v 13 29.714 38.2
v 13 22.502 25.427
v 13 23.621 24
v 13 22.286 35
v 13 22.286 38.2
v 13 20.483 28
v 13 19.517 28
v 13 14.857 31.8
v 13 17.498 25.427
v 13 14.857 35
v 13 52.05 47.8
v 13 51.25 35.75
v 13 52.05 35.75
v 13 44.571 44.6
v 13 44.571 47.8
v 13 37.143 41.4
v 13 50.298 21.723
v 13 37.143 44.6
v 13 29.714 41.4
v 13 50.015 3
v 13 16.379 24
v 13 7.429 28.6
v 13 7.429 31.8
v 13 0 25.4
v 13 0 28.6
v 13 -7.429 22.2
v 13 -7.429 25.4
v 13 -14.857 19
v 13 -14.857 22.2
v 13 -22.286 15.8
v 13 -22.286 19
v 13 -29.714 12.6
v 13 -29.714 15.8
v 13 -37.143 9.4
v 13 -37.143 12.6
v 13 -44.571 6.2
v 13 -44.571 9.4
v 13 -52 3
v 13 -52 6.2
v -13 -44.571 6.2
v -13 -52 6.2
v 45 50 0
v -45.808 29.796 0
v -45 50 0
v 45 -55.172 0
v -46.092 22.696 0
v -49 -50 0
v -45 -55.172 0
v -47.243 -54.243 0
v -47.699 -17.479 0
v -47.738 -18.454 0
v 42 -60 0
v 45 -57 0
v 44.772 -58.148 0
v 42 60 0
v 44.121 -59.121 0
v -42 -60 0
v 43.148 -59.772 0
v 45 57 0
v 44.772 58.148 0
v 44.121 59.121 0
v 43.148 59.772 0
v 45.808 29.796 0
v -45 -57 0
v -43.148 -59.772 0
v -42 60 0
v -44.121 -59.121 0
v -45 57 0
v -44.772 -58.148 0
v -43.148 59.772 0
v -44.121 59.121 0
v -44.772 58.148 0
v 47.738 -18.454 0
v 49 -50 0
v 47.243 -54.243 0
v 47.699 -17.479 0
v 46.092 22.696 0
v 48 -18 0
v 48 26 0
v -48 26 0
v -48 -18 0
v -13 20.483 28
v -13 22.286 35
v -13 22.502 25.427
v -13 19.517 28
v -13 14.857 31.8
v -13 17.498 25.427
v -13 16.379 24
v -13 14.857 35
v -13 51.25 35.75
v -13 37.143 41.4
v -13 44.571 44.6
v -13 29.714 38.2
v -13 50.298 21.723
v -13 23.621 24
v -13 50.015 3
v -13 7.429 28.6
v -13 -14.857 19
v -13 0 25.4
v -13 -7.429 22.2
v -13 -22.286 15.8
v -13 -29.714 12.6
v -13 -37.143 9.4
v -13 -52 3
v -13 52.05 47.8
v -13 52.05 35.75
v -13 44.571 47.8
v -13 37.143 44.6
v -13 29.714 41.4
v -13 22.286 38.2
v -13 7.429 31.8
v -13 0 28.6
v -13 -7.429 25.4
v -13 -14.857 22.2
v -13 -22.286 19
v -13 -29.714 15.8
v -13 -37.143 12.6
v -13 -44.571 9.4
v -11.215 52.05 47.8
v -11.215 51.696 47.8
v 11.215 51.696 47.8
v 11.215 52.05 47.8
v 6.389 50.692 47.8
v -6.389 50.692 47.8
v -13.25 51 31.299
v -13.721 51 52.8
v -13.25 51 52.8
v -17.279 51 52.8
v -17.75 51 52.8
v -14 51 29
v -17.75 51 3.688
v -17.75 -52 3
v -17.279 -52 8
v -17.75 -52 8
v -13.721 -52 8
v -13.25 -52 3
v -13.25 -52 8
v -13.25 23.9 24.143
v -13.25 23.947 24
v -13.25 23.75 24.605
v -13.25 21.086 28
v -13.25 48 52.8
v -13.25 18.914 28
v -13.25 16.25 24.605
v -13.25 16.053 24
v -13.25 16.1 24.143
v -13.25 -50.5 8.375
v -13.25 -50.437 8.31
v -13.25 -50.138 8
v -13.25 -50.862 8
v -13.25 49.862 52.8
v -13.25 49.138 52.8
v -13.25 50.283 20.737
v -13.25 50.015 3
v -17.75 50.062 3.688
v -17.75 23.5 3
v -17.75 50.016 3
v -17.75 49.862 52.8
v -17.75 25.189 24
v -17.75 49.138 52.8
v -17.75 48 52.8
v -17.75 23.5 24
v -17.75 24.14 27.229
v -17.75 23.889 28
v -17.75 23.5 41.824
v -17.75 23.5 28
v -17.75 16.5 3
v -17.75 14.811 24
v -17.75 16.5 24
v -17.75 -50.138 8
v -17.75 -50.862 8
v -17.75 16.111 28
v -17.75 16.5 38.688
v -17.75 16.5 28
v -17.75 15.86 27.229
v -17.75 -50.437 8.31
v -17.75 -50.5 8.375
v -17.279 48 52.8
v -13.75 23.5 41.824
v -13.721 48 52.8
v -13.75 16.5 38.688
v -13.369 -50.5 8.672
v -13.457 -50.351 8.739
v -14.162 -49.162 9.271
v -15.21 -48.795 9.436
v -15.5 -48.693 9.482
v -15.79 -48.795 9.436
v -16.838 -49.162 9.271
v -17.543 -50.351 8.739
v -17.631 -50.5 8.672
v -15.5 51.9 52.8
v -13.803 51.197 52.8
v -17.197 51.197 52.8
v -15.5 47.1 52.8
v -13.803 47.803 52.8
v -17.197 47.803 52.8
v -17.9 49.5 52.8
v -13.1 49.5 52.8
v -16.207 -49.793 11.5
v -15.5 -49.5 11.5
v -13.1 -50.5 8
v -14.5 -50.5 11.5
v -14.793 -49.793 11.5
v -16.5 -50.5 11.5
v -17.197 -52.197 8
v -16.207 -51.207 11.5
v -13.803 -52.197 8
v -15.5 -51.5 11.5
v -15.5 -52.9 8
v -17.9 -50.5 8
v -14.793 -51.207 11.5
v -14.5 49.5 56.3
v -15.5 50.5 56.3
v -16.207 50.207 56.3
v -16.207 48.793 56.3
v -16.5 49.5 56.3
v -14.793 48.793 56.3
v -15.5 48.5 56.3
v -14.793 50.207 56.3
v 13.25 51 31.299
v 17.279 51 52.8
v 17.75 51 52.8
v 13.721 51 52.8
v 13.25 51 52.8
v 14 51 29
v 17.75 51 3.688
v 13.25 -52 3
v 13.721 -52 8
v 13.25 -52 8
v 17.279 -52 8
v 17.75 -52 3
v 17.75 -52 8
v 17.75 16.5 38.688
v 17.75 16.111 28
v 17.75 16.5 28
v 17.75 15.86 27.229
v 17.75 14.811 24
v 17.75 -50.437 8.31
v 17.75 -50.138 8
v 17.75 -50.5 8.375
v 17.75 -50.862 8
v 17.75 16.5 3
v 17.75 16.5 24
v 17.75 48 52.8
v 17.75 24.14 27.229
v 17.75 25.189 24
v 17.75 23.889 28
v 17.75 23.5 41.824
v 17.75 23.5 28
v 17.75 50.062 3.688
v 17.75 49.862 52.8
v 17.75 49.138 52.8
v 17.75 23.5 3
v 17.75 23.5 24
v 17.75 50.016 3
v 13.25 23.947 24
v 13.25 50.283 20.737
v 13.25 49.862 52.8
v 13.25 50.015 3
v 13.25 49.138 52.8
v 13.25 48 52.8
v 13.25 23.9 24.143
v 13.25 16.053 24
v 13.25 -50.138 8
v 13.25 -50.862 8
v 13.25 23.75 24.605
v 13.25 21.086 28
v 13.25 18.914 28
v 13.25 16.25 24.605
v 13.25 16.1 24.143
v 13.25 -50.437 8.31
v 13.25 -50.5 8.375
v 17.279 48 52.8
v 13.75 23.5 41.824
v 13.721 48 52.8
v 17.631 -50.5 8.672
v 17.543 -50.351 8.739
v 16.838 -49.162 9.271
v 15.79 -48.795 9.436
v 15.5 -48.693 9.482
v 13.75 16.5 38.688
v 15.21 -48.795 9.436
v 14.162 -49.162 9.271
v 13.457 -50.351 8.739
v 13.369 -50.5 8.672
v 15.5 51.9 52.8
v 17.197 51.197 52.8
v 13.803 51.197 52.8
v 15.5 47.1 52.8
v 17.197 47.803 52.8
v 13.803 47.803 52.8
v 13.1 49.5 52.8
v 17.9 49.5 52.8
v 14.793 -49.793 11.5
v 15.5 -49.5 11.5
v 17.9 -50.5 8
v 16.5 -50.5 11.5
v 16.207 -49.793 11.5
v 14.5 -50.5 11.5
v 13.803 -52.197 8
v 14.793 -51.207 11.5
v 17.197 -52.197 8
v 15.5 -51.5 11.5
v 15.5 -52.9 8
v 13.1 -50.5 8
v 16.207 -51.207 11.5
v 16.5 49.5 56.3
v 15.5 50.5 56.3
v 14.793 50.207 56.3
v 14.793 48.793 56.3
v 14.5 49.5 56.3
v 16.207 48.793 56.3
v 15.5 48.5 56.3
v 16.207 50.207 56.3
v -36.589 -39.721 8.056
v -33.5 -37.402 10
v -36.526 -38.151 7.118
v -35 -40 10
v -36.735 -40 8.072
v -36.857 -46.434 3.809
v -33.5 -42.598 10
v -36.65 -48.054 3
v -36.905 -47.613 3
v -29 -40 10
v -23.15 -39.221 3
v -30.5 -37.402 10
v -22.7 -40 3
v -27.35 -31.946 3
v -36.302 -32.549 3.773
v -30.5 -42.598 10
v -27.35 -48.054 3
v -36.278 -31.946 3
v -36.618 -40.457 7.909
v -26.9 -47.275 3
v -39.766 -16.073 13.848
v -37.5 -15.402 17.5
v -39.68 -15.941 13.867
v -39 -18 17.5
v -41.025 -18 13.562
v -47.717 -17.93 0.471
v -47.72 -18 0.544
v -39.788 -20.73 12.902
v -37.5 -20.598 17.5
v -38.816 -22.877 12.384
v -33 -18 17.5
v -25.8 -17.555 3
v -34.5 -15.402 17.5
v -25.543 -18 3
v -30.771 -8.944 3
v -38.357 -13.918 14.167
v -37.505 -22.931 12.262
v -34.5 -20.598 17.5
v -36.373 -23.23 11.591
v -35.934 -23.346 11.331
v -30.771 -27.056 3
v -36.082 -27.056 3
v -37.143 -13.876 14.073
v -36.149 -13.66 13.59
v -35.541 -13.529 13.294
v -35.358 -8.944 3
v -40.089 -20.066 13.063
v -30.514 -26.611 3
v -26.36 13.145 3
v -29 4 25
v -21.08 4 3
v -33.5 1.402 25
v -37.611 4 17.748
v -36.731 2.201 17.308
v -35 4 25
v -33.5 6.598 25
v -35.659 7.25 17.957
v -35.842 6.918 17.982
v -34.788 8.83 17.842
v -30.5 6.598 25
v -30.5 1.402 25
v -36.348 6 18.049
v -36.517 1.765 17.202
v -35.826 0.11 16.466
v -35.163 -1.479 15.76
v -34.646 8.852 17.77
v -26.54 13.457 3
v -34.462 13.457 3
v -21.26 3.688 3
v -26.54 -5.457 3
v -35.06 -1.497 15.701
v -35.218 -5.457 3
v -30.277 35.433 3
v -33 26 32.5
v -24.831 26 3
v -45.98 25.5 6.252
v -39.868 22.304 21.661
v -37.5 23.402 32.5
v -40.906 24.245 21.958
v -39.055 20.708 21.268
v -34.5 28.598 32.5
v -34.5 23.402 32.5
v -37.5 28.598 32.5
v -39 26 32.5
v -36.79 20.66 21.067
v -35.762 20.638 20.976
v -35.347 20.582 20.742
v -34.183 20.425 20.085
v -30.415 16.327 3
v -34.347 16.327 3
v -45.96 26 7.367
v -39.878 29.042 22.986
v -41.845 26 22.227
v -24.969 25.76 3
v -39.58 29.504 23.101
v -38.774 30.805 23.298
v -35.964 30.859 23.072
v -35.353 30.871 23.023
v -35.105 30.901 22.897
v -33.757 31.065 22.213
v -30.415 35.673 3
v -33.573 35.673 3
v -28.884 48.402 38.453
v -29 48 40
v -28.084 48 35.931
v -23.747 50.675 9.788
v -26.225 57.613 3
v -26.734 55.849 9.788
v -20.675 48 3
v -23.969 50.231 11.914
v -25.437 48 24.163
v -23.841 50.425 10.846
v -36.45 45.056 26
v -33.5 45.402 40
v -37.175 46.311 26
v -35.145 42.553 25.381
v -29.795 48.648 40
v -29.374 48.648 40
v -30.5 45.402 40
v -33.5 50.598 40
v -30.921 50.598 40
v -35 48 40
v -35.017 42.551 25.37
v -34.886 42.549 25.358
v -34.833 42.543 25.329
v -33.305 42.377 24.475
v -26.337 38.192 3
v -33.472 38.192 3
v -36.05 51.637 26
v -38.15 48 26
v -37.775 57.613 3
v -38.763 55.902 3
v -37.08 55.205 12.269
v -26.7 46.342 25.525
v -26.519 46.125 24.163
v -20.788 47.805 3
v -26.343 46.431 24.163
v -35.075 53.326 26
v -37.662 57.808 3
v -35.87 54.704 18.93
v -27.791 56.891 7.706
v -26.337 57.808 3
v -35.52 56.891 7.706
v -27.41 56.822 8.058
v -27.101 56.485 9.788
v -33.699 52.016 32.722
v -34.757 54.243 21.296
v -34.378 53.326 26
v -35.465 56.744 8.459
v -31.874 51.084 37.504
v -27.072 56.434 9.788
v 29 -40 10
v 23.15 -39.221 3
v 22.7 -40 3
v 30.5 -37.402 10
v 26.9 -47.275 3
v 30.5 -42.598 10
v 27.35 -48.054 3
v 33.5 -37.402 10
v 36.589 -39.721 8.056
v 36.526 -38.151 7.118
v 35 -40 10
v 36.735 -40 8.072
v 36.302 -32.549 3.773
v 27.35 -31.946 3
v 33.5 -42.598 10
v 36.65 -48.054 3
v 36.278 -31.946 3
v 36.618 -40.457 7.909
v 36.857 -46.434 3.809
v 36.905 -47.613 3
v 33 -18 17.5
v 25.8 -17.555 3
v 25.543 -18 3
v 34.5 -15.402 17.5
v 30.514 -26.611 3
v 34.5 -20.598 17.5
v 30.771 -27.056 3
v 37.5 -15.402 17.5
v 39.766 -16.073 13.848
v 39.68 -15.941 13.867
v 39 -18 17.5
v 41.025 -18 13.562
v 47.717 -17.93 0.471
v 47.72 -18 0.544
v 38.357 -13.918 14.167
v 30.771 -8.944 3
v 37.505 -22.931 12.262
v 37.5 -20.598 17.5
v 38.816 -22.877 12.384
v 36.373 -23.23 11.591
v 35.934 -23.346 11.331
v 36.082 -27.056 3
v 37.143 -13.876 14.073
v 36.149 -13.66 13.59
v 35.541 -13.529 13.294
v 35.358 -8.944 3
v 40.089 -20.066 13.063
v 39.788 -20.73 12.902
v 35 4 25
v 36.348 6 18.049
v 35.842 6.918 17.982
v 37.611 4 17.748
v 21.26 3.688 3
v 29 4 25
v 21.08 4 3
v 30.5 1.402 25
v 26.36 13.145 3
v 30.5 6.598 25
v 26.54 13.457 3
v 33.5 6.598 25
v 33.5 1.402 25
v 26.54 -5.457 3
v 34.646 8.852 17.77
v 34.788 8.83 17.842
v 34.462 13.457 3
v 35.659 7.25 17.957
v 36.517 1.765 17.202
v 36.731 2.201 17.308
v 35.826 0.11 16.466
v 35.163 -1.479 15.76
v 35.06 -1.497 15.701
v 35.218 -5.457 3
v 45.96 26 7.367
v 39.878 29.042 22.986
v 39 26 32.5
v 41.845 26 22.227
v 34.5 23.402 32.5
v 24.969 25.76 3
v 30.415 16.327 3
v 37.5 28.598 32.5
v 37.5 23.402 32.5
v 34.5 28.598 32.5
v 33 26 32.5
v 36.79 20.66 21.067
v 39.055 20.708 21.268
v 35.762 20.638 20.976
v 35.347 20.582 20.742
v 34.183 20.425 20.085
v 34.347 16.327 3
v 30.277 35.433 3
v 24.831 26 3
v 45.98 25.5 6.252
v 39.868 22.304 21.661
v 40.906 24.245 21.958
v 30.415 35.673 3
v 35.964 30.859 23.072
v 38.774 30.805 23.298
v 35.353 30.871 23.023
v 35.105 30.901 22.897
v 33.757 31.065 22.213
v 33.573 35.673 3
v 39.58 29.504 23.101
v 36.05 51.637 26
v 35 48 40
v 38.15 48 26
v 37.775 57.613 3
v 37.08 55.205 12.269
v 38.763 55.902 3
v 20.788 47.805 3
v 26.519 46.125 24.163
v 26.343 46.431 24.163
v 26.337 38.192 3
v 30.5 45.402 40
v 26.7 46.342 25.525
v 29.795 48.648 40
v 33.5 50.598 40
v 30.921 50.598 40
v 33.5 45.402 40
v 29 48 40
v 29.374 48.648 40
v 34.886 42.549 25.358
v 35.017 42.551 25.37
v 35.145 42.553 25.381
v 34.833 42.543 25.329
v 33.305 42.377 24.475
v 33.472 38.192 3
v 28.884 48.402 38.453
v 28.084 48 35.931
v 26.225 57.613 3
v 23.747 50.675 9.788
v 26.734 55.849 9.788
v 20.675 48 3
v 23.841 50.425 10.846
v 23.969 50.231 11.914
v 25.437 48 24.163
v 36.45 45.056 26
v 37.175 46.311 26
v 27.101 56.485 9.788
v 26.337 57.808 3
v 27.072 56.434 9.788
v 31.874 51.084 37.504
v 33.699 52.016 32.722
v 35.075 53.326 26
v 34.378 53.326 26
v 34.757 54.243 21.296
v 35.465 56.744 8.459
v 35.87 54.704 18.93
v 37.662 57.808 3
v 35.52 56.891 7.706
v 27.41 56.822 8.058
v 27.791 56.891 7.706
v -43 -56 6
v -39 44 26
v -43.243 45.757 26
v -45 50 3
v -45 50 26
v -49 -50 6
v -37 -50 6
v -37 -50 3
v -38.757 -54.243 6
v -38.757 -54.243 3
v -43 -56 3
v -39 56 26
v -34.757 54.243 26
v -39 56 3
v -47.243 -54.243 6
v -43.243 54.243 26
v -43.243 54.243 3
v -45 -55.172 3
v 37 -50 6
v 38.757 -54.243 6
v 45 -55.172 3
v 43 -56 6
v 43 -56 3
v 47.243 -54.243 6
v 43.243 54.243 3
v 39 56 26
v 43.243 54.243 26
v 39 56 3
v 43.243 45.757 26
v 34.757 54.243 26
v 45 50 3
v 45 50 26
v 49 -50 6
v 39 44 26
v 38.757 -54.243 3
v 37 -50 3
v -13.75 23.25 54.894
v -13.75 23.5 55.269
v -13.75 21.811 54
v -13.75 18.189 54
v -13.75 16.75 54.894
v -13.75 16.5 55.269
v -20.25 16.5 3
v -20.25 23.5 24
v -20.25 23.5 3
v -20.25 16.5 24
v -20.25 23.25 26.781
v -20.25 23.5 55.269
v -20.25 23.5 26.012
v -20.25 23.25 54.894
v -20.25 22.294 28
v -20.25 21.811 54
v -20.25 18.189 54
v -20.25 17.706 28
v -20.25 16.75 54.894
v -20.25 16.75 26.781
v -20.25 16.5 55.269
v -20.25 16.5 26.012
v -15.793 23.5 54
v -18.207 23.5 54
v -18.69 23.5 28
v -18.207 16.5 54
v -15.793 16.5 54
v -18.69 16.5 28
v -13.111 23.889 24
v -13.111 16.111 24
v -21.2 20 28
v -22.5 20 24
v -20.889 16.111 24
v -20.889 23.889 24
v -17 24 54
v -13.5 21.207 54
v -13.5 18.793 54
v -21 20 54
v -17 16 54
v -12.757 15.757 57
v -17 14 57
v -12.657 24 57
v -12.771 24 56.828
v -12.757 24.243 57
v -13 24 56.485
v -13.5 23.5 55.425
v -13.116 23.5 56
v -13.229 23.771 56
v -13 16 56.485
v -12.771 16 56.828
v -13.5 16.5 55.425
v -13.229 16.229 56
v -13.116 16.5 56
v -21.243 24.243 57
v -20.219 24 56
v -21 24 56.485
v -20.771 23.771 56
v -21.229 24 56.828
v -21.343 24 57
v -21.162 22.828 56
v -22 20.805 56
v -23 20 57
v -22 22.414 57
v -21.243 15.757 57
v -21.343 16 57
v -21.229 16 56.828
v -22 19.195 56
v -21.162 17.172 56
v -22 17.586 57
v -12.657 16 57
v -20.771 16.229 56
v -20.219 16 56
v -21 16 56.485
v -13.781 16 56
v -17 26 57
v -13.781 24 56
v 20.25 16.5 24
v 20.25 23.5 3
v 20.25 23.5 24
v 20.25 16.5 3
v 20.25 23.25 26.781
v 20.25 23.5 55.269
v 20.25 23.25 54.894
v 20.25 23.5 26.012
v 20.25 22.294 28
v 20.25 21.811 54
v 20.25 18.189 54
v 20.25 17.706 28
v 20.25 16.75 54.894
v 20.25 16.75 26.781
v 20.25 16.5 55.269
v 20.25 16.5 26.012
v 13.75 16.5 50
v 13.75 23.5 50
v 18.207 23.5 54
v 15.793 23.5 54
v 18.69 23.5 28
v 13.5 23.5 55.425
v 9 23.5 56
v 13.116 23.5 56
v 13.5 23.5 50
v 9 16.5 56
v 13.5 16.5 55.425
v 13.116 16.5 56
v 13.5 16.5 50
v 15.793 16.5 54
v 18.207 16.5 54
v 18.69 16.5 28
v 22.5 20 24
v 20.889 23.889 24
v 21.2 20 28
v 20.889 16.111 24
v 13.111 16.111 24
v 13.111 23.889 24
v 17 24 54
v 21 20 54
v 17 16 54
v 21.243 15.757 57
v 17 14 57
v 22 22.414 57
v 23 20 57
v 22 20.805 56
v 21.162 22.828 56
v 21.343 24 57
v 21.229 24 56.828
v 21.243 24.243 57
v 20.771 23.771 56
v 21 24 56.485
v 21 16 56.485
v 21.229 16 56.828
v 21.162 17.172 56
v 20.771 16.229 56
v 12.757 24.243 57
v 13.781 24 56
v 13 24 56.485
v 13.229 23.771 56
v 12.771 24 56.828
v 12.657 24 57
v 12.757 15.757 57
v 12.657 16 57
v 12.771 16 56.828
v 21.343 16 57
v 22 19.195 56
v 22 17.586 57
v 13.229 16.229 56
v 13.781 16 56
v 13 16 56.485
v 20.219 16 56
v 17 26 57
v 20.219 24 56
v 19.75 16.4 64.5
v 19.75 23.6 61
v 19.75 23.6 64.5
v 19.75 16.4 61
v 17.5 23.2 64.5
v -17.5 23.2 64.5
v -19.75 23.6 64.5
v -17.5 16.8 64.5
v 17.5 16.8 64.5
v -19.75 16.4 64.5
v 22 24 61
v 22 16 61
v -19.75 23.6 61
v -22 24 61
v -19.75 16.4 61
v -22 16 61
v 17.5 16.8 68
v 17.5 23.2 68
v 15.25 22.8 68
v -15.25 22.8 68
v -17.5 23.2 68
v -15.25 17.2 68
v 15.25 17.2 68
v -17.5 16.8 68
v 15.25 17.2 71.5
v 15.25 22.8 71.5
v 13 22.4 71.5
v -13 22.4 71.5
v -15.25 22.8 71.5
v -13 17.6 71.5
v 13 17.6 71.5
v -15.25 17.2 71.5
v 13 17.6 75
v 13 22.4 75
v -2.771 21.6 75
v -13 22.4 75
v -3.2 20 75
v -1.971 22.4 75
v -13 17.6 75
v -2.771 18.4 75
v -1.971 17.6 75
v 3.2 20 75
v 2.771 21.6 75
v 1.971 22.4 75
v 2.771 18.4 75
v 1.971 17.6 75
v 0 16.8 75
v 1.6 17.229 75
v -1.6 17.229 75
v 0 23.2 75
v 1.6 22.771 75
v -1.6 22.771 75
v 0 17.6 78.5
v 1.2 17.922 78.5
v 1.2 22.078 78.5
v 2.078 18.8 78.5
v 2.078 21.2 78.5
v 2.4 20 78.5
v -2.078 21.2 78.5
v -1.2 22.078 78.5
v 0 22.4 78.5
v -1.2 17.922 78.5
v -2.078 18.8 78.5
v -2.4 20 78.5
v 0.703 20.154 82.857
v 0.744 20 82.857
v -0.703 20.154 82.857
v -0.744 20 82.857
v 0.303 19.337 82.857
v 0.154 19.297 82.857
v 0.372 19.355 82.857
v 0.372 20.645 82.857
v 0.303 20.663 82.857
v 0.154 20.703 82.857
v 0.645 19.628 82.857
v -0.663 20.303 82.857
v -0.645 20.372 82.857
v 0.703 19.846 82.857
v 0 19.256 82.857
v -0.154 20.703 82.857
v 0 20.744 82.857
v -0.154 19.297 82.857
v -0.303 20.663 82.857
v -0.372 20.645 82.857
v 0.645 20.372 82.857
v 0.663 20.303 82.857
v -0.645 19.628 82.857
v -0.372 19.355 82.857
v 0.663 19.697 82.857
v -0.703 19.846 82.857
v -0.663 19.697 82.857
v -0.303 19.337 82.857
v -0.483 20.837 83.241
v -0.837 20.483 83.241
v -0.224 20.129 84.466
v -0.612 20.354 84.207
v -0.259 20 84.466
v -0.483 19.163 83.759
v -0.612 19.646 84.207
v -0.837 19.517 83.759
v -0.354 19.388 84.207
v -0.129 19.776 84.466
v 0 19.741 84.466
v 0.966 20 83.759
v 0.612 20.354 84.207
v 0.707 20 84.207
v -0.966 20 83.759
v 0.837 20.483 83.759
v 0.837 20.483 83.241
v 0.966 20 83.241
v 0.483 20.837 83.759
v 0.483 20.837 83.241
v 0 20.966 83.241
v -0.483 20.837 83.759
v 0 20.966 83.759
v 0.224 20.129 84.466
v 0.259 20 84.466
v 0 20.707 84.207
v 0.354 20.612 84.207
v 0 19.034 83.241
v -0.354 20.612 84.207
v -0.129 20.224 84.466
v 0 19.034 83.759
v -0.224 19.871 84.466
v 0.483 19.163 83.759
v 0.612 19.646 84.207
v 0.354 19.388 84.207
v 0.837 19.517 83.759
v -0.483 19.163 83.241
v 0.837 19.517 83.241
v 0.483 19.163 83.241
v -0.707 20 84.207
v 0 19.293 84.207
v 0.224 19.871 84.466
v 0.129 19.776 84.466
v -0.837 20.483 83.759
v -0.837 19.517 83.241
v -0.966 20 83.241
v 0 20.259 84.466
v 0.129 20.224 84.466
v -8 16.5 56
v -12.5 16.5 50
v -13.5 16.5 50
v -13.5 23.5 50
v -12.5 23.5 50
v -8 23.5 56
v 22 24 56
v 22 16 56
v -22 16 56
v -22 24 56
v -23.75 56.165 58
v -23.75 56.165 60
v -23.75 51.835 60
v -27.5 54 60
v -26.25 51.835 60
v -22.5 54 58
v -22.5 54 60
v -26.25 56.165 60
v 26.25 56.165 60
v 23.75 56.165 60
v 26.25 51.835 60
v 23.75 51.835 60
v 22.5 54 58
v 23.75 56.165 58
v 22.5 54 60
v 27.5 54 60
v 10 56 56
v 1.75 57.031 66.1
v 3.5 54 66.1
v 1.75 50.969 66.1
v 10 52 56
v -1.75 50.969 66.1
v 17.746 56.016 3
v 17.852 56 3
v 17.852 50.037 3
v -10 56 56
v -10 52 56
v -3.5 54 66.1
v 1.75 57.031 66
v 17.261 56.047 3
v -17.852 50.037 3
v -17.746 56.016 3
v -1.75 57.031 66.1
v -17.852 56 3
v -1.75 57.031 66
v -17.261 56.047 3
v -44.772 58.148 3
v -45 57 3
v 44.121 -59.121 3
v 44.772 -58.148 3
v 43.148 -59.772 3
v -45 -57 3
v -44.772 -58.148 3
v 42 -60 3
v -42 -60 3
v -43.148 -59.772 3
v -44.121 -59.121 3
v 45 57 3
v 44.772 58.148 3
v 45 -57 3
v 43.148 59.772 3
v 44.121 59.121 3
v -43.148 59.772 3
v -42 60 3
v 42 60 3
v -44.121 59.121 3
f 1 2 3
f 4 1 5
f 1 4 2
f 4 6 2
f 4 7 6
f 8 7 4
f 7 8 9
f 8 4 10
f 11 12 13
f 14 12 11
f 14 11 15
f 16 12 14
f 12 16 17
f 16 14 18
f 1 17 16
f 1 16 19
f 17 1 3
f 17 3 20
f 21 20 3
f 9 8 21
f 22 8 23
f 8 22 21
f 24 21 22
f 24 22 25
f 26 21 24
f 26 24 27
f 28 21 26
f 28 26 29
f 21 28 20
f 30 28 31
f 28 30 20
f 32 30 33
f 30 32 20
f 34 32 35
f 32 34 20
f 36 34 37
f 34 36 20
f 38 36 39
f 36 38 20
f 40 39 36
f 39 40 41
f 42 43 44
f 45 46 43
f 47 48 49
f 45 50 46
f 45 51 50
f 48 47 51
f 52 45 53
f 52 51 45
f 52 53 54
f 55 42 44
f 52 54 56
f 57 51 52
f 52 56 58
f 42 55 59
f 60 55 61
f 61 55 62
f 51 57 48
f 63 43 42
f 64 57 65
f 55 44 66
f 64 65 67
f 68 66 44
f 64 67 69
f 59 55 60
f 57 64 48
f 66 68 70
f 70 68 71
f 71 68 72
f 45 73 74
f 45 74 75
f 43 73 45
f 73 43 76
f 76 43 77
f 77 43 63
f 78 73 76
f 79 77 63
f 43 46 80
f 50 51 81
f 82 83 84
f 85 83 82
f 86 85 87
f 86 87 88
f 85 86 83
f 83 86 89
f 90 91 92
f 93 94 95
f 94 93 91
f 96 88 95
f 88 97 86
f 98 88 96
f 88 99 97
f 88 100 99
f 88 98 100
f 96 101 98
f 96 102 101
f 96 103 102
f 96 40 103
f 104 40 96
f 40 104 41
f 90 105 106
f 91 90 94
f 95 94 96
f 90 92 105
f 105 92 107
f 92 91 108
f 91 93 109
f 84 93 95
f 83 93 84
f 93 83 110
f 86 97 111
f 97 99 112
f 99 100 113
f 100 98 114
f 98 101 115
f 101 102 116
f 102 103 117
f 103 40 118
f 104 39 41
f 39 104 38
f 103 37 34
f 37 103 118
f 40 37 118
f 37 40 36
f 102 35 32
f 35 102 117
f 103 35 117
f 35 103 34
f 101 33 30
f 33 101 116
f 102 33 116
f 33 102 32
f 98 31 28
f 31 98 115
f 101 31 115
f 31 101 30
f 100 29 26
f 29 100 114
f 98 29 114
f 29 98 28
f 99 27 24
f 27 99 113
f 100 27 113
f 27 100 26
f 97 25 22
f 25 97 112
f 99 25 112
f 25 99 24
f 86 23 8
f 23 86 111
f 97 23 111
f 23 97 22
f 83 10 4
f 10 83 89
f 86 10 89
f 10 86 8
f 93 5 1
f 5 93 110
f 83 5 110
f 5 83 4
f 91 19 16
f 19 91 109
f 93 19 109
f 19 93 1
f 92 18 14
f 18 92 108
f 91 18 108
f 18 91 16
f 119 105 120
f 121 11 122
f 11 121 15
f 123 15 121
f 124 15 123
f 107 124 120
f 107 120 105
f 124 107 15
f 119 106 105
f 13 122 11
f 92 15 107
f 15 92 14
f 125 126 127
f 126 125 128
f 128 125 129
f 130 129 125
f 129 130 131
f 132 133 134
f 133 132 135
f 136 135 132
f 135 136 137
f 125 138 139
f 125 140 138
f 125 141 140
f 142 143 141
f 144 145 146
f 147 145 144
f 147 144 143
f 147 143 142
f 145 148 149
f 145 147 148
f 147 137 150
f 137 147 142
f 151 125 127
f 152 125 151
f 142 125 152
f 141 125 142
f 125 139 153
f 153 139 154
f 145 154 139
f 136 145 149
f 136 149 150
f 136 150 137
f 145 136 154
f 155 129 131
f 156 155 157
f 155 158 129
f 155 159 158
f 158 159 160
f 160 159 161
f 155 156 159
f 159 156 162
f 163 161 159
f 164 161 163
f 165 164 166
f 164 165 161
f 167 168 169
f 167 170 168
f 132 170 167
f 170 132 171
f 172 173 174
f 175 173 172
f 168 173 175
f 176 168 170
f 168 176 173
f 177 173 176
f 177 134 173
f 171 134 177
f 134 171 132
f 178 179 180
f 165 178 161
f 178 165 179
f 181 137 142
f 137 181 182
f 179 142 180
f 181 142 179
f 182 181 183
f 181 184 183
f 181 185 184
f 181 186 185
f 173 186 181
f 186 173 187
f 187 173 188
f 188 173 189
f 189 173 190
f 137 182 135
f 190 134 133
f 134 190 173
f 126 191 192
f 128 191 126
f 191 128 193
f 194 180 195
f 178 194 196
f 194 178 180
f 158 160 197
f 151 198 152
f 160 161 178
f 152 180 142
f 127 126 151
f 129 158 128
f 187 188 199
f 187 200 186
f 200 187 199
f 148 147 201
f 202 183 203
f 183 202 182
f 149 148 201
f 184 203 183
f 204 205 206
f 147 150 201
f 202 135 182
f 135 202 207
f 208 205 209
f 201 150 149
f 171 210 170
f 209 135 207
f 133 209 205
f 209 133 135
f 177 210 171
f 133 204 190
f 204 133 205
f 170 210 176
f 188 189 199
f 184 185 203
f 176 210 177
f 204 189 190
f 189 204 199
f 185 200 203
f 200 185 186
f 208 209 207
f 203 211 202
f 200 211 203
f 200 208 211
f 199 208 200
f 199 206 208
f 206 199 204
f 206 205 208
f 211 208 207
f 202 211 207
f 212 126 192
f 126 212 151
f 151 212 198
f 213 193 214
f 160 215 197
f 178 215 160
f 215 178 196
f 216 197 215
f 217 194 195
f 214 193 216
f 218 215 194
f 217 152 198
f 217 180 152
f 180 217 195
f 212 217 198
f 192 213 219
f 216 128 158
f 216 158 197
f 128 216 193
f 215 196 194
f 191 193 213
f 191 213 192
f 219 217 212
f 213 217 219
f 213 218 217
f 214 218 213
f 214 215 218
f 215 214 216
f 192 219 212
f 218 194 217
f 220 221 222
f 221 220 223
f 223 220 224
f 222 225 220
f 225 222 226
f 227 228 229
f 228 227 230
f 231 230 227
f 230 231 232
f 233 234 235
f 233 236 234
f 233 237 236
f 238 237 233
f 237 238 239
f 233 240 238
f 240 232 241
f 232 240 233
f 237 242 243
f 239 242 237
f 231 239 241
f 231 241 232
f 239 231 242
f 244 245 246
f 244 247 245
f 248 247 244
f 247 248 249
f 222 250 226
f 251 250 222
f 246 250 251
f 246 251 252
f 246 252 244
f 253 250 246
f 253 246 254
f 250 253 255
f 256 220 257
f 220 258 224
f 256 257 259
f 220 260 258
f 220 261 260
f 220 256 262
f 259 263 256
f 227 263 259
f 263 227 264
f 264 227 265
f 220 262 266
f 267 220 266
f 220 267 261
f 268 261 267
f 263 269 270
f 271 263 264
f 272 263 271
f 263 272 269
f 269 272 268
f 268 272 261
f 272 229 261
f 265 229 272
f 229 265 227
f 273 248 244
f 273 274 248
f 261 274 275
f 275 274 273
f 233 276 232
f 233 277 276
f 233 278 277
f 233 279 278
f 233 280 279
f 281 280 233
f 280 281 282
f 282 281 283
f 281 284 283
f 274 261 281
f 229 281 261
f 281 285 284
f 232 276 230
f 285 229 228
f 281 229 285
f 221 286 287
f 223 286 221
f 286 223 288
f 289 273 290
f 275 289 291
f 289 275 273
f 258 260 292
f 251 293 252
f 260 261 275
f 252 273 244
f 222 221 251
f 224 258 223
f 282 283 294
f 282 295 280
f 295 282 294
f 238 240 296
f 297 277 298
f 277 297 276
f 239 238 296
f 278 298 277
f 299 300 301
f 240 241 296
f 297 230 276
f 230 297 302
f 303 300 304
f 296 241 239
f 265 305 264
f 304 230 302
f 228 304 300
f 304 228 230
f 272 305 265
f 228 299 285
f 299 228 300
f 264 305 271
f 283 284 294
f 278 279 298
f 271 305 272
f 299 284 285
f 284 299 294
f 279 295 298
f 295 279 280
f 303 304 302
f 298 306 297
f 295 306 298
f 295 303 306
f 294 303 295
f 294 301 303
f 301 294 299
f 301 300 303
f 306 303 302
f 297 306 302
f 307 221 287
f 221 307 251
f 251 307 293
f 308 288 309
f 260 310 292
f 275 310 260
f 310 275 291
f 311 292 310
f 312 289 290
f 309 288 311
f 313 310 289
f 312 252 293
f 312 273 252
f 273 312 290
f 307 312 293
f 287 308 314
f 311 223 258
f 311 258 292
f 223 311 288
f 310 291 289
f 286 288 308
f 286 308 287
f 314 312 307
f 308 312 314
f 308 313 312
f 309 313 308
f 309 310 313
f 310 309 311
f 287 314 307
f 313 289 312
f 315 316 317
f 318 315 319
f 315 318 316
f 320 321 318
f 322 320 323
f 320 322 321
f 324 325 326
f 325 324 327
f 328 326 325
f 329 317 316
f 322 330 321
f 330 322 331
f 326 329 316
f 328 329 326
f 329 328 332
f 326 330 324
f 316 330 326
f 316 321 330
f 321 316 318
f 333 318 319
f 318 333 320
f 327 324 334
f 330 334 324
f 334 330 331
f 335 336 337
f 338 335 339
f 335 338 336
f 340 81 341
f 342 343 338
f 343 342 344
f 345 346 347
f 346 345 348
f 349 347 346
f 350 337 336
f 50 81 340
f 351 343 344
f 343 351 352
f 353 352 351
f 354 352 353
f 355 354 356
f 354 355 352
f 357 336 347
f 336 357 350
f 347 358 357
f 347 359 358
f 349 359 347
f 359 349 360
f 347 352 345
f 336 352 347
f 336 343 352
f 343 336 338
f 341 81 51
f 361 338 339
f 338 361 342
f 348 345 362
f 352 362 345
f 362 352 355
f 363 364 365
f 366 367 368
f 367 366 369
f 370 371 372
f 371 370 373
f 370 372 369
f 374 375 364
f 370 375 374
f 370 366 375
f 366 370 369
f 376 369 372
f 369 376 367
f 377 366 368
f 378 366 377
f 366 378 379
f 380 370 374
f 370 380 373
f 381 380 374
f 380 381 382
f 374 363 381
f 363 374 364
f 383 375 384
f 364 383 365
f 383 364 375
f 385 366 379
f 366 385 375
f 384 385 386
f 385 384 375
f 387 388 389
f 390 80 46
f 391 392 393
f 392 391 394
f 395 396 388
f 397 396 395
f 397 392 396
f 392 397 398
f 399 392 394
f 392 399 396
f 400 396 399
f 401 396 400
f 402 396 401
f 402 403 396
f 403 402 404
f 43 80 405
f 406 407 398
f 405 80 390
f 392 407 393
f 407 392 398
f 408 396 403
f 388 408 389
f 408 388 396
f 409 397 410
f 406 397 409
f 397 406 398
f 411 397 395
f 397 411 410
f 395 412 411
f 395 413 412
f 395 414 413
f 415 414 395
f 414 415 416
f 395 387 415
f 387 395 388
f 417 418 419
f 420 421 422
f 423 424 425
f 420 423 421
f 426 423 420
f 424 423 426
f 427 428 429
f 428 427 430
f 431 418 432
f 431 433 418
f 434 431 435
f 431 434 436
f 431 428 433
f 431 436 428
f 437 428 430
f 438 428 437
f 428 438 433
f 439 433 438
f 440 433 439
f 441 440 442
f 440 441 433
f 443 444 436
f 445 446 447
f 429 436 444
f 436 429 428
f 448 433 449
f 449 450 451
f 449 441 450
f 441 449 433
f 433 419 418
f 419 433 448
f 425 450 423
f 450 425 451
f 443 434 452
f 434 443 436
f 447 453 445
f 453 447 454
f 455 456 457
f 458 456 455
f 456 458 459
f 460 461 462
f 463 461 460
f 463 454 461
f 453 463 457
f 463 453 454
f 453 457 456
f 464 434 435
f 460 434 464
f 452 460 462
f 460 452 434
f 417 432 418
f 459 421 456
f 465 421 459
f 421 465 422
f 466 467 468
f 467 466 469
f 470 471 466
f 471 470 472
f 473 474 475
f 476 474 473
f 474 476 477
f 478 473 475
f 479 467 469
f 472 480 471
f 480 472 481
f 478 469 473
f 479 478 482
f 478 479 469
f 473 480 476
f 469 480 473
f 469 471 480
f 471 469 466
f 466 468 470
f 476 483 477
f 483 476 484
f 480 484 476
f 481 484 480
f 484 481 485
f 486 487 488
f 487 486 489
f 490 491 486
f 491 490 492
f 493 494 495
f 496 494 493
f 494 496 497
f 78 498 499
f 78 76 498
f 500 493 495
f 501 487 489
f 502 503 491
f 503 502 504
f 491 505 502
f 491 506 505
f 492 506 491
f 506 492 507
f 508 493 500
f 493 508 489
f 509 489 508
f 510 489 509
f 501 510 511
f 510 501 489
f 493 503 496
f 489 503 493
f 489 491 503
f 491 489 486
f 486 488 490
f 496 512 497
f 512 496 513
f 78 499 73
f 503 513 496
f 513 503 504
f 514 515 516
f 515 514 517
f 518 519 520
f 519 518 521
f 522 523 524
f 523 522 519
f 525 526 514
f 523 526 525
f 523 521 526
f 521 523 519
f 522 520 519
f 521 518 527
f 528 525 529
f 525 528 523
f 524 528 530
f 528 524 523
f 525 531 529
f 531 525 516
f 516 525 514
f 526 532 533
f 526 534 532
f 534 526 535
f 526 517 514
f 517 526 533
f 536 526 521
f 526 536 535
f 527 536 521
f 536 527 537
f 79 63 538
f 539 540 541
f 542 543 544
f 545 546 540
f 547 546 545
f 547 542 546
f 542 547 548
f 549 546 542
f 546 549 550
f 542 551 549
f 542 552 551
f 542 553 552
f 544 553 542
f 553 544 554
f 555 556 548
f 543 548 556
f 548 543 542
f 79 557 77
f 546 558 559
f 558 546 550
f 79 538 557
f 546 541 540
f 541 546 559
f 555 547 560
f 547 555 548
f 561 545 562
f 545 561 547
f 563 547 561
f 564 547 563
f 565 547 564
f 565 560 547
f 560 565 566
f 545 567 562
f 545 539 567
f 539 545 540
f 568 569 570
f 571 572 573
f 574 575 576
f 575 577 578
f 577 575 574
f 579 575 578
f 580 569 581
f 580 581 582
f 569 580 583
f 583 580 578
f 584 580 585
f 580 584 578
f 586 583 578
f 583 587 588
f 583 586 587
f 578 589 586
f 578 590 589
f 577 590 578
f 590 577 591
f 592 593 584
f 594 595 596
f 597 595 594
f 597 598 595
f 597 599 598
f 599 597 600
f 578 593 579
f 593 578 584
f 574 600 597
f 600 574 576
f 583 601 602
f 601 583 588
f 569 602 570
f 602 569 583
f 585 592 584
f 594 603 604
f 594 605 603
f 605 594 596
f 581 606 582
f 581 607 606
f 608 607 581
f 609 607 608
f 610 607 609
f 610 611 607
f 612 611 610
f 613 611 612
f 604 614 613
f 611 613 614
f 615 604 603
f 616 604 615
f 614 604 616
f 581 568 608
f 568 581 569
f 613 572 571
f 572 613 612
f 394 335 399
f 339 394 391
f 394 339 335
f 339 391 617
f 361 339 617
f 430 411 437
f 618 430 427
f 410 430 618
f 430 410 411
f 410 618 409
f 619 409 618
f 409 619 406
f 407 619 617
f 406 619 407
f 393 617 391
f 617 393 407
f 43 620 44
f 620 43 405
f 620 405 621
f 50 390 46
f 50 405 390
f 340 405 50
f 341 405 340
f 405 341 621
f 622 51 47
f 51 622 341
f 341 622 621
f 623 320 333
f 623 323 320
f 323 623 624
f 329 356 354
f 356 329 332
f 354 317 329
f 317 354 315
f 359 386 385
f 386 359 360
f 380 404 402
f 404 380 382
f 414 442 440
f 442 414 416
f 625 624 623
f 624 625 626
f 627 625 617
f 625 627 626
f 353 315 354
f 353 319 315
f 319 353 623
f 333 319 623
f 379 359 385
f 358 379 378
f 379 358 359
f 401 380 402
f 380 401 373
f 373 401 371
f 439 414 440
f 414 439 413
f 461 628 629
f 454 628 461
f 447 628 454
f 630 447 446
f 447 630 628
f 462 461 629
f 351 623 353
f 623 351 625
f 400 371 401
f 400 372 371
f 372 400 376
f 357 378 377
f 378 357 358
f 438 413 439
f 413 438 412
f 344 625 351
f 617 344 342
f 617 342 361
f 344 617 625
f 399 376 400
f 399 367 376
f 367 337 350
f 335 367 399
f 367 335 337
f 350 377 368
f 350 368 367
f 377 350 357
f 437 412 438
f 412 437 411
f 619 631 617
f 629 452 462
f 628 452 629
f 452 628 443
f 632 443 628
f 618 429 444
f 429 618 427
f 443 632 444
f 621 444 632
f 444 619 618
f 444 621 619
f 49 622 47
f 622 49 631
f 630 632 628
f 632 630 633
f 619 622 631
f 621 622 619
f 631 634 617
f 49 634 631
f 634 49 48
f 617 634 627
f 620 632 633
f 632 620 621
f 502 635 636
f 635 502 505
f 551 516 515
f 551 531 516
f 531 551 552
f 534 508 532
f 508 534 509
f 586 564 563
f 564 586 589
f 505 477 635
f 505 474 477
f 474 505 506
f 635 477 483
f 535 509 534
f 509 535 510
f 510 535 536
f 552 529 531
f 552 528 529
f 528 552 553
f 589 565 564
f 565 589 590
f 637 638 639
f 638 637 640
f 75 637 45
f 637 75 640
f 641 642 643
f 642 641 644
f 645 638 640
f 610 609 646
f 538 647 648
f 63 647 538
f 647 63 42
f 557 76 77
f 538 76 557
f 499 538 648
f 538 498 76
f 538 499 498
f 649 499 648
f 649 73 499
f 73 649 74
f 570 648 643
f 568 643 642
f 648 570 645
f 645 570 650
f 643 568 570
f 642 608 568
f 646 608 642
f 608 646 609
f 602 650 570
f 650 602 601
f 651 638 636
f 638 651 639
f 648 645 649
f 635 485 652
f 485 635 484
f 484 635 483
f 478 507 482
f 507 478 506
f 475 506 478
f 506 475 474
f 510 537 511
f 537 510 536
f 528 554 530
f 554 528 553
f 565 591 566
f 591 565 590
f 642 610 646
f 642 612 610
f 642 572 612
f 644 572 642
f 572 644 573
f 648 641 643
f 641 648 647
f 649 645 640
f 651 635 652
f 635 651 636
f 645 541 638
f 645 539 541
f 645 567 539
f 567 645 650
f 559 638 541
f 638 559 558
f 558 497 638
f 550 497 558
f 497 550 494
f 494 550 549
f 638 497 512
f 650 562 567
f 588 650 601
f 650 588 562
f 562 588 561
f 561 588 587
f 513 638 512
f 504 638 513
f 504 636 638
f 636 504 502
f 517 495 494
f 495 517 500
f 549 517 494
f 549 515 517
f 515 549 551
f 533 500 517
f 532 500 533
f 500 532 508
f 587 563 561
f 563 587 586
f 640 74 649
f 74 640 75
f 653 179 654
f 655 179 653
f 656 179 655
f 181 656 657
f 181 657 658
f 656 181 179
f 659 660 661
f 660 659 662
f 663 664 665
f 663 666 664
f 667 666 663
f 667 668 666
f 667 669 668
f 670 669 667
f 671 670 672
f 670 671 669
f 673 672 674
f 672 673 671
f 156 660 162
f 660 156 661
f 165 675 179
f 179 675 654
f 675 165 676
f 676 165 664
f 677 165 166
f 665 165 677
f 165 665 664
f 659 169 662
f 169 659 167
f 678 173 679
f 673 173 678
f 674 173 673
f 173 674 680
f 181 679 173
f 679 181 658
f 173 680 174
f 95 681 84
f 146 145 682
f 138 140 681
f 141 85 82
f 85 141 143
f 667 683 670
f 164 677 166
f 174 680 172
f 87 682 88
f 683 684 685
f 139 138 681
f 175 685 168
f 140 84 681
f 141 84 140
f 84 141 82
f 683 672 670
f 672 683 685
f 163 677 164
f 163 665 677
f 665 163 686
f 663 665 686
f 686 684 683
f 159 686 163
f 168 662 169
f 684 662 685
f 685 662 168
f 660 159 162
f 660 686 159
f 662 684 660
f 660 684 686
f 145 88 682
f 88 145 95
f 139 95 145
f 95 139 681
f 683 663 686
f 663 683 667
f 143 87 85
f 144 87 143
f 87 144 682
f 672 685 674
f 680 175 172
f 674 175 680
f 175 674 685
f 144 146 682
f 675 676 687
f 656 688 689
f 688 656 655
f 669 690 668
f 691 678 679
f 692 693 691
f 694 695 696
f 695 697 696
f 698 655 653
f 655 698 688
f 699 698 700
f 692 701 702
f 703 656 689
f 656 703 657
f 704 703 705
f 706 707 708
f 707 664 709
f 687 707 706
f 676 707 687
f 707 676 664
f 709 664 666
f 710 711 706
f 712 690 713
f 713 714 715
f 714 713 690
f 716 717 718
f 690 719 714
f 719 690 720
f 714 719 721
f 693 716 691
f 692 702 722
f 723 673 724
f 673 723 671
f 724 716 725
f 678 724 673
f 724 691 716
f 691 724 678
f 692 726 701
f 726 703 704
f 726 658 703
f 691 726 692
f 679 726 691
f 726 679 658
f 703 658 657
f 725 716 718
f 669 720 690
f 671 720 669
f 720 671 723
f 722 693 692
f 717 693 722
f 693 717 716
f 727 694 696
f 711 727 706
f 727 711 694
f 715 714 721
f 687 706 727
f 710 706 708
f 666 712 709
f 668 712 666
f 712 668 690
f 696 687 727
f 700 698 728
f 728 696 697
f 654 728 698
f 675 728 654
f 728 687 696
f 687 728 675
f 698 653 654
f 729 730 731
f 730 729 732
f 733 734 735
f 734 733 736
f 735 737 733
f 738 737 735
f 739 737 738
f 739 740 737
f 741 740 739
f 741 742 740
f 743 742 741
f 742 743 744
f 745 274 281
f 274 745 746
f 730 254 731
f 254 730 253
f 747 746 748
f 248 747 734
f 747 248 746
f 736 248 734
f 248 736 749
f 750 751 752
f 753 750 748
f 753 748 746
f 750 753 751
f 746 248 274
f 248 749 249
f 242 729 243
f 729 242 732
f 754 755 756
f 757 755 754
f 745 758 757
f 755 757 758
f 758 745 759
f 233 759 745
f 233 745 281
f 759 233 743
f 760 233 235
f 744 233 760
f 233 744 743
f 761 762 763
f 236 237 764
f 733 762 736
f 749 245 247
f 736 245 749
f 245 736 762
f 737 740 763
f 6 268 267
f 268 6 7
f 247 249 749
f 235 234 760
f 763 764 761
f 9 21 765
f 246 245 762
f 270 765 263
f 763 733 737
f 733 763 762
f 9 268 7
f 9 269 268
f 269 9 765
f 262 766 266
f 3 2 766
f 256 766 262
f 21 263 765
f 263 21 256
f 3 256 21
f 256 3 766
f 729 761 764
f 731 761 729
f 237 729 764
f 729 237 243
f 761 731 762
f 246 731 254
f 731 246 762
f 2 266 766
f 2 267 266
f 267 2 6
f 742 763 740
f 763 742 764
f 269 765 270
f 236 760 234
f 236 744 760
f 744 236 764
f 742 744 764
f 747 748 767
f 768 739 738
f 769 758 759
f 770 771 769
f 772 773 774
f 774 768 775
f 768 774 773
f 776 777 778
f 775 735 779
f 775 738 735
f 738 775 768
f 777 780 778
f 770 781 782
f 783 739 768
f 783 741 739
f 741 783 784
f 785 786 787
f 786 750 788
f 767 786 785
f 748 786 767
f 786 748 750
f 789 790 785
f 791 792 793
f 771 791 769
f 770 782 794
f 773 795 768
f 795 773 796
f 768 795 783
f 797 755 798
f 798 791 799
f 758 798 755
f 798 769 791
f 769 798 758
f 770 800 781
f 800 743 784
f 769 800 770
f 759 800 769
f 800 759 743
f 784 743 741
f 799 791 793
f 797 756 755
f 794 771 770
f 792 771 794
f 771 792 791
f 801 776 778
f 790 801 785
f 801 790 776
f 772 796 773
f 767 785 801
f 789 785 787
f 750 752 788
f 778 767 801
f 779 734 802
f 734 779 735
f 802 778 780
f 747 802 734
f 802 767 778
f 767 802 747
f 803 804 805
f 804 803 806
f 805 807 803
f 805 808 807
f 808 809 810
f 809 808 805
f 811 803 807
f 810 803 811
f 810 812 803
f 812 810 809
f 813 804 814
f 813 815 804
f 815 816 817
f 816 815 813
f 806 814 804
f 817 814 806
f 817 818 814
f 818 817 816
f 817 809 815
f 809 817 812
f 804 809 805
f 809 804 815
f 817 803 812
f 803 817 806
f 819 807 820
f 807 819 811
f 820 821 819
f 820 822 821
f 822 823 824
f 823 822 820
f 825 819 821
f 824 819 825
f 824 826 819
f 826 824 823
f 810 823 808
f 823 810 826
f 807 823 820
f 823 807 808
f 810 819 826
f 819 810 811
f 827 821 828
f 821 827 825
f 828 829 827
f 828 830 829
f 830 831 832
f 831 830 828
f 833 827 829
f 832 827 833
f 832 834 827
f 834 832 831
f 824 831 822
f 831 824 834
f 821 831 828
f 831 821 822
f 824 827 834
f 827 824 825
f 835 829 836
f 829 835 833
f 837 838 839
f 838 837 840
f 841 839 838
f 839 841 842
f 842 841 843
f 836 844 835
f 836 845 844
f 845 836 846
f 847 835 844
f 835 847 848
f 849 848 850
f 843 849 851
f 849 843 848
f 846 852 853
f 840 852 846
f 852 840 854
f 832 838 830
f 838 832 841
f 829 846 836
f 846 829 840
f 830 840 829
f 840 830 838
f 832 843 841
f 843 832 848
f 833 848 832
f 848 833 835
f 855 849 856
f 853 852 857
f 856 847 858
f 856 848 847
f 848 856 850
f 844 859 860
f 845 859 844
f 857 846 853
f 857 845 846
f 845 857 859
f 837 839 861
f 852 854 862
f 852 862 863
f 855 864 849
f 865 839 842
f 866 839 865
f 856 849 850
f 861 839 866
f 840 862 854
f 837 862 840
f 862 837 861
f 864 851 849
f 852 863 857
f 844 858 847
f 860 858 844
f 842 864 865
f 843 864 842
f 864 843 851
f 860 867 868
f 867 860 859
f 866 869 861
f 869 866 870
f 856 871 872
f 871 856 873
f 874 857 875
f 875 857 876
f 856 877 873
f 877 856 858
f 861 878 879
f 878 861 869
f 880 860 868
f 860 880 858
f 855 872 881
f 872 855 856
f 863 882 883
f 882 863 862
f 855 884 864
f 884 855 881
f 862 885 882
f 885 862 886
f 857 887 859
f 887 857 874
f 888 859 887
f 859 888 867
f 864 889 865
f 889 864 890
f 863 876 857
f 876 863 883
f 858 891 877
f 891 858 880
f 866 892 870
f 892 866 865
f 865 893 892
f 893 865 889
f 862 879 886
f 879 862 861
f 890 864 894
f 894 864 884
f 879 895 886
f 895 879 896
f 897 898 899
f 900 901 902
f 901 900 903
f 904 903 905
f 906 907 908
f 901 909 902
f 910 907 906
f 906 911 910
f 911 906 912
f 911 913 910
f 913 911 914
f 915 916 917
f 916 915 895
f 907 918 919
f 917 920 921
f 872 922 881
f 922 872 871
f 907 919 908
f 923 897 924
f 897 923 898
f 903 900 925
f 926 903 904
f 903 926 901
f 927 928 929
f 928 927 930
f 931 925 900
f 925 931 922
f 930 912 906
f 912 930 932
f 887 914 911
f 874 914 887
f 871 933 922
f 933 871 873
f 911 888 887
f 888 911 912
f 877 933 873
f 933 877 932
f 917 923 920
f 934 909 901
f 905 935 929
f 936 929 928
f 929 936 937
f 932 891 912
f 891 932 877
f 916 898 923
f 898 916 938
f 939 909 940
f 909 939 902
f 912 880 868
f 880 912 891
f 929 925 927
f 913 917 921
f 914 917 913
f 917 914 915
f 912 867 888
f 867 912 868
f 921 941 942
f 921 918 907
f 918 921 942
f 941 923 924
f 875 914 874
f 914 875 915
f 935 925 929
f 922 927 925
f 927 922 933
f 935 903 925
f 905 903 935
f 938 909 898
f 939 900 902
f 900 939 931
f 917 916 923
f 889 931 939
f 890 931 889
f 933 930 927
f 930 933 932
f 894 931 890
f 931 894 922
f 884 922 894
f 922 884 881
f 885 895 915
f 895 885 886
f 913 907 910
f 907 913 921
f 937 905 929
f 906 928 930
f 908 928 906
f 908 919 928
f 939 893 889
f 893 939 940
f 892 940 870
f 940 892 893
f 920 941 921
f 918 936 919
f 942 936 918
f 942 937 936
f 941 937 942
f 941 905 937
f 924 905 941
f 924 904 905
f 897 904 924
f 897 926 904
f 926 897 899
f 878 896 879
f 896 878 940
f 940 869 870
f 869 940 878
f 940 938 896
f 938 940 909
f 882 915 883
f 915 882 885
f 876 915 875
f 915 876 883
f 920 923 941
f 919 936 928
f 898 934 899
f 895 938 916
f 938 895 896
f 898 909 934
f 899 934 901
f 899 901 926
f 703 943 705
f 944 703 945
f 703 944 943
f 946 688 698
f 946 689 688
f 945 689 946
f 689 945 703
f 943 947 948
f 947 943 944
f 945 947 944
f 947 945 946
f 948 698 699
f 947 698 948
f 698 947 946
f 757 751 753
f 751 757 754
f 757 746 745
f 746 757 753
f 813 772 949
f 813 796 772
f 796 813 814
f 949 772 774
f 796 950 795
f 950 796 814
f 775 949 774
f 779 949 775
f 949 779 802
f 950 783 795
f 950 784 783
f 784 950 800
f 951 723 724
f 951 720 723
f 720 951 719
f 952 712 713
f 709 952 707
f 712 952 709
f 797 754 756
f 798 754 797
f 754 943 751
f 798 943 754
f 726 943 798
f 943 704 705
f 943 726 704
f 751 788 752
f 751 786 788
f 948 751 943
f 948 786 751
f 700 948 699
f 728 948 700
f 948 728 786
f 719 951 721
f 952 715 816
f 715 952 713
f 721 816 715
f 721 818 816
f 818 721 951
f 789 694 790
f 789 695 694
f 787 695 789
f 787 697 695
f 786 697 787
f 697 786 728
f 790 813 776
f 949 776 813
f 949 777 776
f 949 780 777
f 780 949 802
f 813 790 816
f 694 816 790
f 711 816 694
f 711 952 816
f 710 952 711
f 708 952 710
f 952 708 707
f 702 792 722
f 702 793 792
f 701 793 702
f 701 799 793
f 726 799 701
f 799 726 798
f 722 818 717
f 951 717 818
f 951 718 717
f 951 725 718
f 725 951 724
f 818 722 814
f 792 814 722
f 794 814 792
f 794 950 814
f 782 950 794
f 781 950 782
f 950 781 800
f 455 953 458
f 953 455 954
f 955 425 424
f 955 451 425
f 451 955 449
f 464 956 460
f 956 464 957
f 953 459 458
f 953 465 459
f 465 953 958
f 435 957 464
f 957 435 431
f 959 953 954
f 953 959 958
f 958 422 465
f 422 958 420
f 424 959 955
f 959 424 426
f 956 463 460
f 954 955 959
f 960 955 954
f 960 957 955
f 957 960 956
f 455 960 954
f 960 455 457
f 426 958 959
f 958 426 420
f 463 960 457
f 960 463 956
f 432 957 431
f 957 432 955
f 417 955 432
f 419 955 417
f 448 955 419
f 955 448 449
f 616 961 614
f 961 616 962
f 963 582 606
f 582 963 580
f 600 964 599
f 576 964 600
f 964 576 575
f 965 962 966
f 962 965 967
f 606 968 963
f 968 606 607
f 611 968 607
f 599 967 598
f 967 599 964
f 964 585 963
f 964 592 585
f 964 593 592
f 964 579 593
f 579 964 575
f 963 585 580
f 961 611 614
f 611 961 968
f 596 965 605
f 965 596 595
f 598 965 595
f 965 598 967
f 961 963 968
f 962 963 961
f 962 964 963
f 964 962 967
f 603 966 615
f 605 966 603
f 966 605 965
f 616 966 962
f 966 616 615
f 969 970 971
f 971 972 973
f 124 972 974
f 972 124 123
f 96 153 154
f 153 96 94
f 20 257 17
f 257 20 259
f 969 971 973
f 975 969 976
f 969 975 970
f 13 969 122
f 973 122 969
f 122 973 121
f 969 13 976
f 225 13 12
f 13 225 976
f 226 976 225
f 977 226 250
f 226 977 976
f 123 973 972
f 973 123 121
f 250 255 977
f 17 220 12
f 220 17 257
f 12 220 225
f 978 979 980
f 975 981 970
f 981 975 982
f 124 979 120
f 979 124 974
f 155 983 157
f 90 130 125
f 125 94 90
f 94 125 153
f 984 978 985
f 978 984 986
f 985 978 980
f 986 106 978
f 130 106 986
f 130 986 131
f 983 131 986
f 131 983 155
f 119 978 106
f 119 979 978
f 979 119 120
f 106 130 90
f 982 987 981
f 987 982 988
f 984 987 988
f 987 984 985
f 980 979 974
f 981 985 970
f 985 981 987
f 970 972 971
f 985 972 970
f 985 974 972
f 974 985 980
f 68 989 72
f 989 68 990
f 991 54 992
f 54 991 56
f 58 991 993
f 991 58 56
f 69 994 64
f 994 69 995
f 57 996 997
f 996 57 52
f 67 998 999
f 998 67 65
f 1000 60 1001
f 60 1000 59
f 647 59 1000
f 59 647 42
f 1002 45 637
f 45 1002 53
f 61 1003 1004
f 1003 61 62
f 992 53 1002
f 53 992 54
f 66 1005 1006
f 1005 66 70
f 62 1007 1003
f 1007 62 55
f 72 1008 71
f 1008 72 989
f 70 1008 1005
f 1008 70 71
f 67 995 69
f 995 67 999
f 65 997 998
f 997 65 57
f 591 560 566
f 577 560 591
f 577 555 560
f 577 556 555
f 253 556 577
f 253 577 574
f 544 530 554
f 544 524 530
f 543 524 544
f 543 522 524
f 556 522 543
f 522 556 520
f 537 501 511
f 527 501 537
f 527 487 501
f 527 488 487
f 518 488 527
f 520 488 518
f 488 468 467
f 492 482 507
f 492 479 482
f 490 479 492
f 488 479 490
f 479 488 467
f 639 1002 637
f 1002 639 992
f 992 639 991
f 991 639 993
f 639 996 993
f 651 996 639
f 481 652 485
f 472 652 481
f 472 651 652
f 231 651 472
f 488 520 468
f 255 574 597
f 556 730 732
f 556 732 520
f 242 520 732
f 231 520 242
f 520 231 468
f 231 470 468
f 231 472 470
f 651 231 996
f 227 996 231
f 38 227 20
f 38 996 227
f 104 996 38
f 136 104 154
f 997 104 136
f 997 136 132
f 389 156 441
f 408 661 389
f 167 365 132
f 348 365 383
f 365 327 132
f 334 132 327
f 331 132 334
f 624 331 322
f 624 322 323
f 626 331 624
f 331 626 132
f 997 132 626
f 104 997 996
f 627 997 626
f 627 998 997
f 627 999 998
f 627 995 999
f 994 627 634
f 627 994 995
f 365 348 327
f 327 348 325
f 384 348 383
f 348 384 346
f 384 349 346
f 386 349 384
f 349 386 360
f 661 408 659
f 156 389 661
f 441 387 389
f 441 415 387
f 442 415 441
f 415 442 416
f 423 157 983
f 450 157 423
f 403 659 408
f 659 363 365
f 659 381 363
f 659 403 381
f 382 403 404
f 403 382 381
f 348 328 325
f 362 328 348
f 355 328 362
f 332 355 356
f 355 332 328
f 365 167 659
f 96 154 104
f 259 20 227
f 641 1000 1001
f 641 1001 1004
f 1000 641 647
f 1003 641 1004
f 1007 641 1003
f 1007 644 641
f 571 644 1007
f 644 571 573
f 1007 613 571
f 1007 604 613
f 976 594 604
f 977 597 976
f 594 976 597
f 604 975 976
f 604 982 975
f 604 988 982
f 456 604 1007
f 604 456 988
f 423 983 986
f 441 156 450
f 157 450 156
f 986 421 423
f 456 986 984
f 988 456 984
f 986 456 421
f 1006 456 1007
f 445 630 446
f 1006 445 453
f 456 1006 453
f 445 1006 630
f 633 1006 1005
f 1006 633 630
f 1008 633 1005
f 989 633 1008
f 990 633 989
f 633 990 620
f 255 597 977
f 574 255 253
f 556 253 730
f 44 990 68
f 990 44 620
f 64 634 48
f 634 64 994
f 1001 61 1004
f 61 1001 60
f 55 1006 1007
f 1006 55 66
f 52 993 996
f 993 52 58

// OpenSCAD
// ====================================================================
// SWARGAROHINI: STAIRWAY TO HEAVEN ENTRANCE GATEWAY
// Location: Garhwal Himalayas, Uttarakhand, India
// Mythological Origin: Pandavas' Mahaprasthanika Parva final ascent
// Design: 100% Manifold, Supportless FDM 3D Printable (<=45° Overhangs)
// ====================================================================

$fn = 32;
eps = 0.05;

// Main Dimensions
base_w = 90.0;    // Width (X)
base_d = 120.0;   // Depth / Run (Y)
base_h = 3.0;     // Base plinth thickness

// Overall Scene
swargarohini_entrance_portal();

module swargarohini_entrance_portal() {
    union() {
        // --- 1. MOUNTAIN TERRAIN BASE PLINTH ---
        mountain_base_plinth();

        // --- 2. ASCENDING STONE STAIRWAY ("SWARG KI SEEDHI") ---
        ascending_stairway();

        // --- 3. FLANKING GLACIAL CRAGS & ROCK LEDGES ---
        flanking_crags();

        // --- 4. SACRED HIMALAYAN ENTRANCE GATEWAY (SWARGA DWARA) ---
        translate([0, 20.0, 0])
            swarga_dwara_arch();

        // --- 5. CELESTIAL PINNACLE CLOUD STEPS (HIGH SUMMIT) ---
        summit_portal_backdrop();
    }
}

// 1. Solid Grounding Base Plinth
module mountain_base_plinth() {
    hull() {
        translate([-base_w/2 + 3, -base_d/2 + 3, 0]) cylinder(r = 3, h = base_h, $fn = 16);
        translate([ base_w/2 - 3, -base_d/2 + 3, 0]) cylinder(r = 3, h = base_h, $fn = 16);
        translate([ base_w/2 - 3,  base_d/2 - 3, 0]) cylinder(r = 3, h = base_h, $fn = 16);
        translate([-base_w/2 + 3,  base_d/2 - 3, 0]) cylinder(r = 3, h = base_h, $fn = 16);
    }
}

// 2. Ascending Stone Stairway
module ascending_stairway() {
    num_steps = 14;
    stair_w = 26.0;
    stair_start_y = -base_d/2 + 8.0;
    stair_end_y = base_d/2 - 8.0;
    y_step_pitch = (stair_end_y - stair_start_y) / num_steps;
    z_rise = 3.2;

    union() {
        // Solid core mass under stairs (Zero hollows, zero non-manifold edges)
        hull() {
            translate([-stair_w/2, stair_start_y, 0])
                cube([stair_w, 2.0, base_h]);
            translate([-stair_w/2, stair_end_y - y_step_pitch, 0])
                cube([stair_w, 2.0, base_h + (num_steps - 1) * z_rise]);
        }

        // Stepped risers and stone treads
        for (i = [0 : num_steps - 1]) {
            y_pos = stair_start_y + i * y_step_pitch;
            h_pos = base_h + (i + 1) * z_rise;
            translate([-stair_w/2, y_pos, 0])
                cube([stair_w, y_step_pitch + eps, h_pos]);
        }

        // Flanking Stone Balustrades with supportless 45° slope
        for (side = [-1, 1]) {
            translate([side * (stair_w/2 + 2.5), 0, 0])
                balustrade(stair_start_y, stair_end_y, num_steps, z_rise);
        }
    }
}

// Stair Balustrade / Retaining Wall
module balustrade(y_start, y_end, steps, rise) {
    b_thick = 4.5;
    h_start = base_h + 5.0;
    h_end = base_h + steps * rise + 5.0;

    hull() {
        translate([-b_thick/2, y_start, 0])
            cube([b_thick, 3.0, h_start]);
        translate([-b_thick/2, y_end - 4.0, 0])
            cube([b_thick, 3.0, h_end]);
    }
    // Decorative Tibetan/Himalayan Mani stone markers on piers
    translate([0, y_start + 1.5, h_start])
        cylinder(r1 = 2.4, r2 = 1.0, h = 3.5, $fn = 8);
    translate([0, y_end - 2.5, h_end])
        cylinder(r1 = 2.4, r2 = 1.0, h = 3.5, $fn = 8);
}

// 3. Glacial Crags & Layered Himalayan Rocks (Supportless <= 45° slopes)
module flanking_crags() {
    union() {
        // Left Ridge
        for (i = [0 : 4]) {
            y_c = -40 + i * 22;
            x_c = -32 - (i % 2) * 4;
            h_c = 10 + i * 7.5;
            translate([x_c, y_c, 0])
                cylinder(r1 = 12.0, r2 = 3.0, h = h_c, $fn = 6);
        }

        // Right Ridge
        for (i = [0 : 4]) {
            y_c = -40 + i * 22;
            x_c = 32 + (i % 2) * 4;
            h_c = 10 + i * 7.5;
            translate([x_c, y_c, 0])
                cylinder(r1 = 12.0, r2 = 3.0, h = h_c, $fn = 6);
        }

        // Interlocking rock footings
        hull() {
            translate([-base_w/2 + 2, -base_d/2 + 10, 0]) cylinder(r = 6, h = 6, $fn = 8);
            translate([-base_w/2 + 6,  base_d/2 - 10, 0]) cylinder(r = 6, h = 26, $fn = 8);
        }
        hull() {
            translate([ base_w/2 - 2, -base_d/2 + 10, 0]) cylinder(r = 6, h = 6, $fn = 8);
            translate([ base_w/2 - 6,  base_d/2 - 10, 0]) cylinder(r = 6, h = 26, $fn = 8);
        }
    }
}

// 4. Sacred Swarga Dwara (Gateway Arch)
module swarga_dwara_arch() {
    pillar_span = 34.0; // Distance between pillars
    pillar_w = 6.5;
    pillar_d = 7.0;
    arch_base_z = 24.0; // Anchors into mountain stairs at Y=20
    arch_h = 32.0;

    union() {
        // Left & Right Carved Gate Pillars
        for (s = [-1, 1]) {
            translate([s * pillar_span/2, 0, 0]) {
                // Grounded Pillar Column from Z=0 up to arch beam
                translate([-pillar_w/2, -pillar_d/2, 0])
                    cube([pillar_w, pillar_d, arch_base_z + arch_h]);

                // Stepped base plinth
                translate([0, 0, arch_base_z])
                    cylinder(r1 = 5.5, r2 = 4.2, h = 4.0, $fn = 8);

                // Capital bracket
                translate([0, 0, arch_base_z + arch_h - 2.0])
                    cylinder(r1 = 4.0, r2 = 6.0, h = 3.0, $fn = 8);
            }
        }

        // Supportless Pointed Arch (Gothic / Nagara Torana arch <=45°)
        translate([0, 0, arch_base_z + arch_h]) {
            // Main lintel beam
            translate([-pillar_span/2 - 5, -pillar_d/2 - 0.5, 0])
                cube([pillar_span + 10, pillar_d + 1.0, 5.0]);

            // Stepped Nagara Cornice Roof (45° stepped overhangs)
            for (level = [1 : 4]) {
                roof_w = pillar_span + 10 - level * 4.5;
                roof_d = pillar_d + 1.0 - level * 0.8;
                roof_z = 5.0 + (level - 1) * 3.5;
                translate([-roof_w/2, -roof_d/2, roof_z])
                    cube([roof_w, roof_d, 3.5]);
            }

            // Sacred Kalasha Finial Peak
            translate([0, 0, 5.0 + 4 * 3.5]) {
                cylinder(r1 = 3.2, r2 = 2.4, h = 3.5, $fn = 12);
                translate([0, 0, 3.5]) cylinder(r1 = 2.4, r2 = 0.5, h = 5.0, $fn = 12);
                translate([0, 0, 8.5]) sphere(r = 1.0, $fn = 12);
            }

            // Under-Arch Gusset Brackets (45° chamfered transitions - zero bridging issues)
            for (s = [-1, 1]) {
                translate([s * (pillar_span/2 - 3.5), 0, -6.0]) {
                    hull() {
                        translate([0, -pillar_d/2, 6.0]) cube([1.0, pillar_d, 0.5]);
                        translate([-s * 4.5, -pillar_d/2, 6.0]) cube([1.0, pillar_d, 0.5]);
                        translate([0, -pillar_d/2, 0.0]) cube([1.0, pillar_d, 0.5]);
                    }
                }
            }
        }
    }
}

// 5. High Summit Backdrop / Swargarohini Mountain Gate
module summit_portal_backdrop() {
    summit_y = base_d/2 - 6.0;
    summit_z = 48.0;

    union() {
        // Central Peak Gateway Backdrop
        hull() {
            translate([-18, summit_y - 4, 0]) cube([36, 6, 2]);
            translate([-10, summit_y - 2, summit_z]) cube([20, 4, 8]);
            translate([0, summit_y, summit_z + 18]) cylinder(r = 3.5, h = 0.1, $fn = 6);
        }

        // Flanking High Needle Peaks
        for (s = [-1, 1]) {
            hull() {
                translate([s * 32, summit_y - 4, 0]) cylinder(r = 8, h = 5, $fn = 6);
                translate([s * 25, summit_y, summit_z + 10]) cylinder(r = 2.5, h = 2, $fn = 6);
            }
        }
    }
}
